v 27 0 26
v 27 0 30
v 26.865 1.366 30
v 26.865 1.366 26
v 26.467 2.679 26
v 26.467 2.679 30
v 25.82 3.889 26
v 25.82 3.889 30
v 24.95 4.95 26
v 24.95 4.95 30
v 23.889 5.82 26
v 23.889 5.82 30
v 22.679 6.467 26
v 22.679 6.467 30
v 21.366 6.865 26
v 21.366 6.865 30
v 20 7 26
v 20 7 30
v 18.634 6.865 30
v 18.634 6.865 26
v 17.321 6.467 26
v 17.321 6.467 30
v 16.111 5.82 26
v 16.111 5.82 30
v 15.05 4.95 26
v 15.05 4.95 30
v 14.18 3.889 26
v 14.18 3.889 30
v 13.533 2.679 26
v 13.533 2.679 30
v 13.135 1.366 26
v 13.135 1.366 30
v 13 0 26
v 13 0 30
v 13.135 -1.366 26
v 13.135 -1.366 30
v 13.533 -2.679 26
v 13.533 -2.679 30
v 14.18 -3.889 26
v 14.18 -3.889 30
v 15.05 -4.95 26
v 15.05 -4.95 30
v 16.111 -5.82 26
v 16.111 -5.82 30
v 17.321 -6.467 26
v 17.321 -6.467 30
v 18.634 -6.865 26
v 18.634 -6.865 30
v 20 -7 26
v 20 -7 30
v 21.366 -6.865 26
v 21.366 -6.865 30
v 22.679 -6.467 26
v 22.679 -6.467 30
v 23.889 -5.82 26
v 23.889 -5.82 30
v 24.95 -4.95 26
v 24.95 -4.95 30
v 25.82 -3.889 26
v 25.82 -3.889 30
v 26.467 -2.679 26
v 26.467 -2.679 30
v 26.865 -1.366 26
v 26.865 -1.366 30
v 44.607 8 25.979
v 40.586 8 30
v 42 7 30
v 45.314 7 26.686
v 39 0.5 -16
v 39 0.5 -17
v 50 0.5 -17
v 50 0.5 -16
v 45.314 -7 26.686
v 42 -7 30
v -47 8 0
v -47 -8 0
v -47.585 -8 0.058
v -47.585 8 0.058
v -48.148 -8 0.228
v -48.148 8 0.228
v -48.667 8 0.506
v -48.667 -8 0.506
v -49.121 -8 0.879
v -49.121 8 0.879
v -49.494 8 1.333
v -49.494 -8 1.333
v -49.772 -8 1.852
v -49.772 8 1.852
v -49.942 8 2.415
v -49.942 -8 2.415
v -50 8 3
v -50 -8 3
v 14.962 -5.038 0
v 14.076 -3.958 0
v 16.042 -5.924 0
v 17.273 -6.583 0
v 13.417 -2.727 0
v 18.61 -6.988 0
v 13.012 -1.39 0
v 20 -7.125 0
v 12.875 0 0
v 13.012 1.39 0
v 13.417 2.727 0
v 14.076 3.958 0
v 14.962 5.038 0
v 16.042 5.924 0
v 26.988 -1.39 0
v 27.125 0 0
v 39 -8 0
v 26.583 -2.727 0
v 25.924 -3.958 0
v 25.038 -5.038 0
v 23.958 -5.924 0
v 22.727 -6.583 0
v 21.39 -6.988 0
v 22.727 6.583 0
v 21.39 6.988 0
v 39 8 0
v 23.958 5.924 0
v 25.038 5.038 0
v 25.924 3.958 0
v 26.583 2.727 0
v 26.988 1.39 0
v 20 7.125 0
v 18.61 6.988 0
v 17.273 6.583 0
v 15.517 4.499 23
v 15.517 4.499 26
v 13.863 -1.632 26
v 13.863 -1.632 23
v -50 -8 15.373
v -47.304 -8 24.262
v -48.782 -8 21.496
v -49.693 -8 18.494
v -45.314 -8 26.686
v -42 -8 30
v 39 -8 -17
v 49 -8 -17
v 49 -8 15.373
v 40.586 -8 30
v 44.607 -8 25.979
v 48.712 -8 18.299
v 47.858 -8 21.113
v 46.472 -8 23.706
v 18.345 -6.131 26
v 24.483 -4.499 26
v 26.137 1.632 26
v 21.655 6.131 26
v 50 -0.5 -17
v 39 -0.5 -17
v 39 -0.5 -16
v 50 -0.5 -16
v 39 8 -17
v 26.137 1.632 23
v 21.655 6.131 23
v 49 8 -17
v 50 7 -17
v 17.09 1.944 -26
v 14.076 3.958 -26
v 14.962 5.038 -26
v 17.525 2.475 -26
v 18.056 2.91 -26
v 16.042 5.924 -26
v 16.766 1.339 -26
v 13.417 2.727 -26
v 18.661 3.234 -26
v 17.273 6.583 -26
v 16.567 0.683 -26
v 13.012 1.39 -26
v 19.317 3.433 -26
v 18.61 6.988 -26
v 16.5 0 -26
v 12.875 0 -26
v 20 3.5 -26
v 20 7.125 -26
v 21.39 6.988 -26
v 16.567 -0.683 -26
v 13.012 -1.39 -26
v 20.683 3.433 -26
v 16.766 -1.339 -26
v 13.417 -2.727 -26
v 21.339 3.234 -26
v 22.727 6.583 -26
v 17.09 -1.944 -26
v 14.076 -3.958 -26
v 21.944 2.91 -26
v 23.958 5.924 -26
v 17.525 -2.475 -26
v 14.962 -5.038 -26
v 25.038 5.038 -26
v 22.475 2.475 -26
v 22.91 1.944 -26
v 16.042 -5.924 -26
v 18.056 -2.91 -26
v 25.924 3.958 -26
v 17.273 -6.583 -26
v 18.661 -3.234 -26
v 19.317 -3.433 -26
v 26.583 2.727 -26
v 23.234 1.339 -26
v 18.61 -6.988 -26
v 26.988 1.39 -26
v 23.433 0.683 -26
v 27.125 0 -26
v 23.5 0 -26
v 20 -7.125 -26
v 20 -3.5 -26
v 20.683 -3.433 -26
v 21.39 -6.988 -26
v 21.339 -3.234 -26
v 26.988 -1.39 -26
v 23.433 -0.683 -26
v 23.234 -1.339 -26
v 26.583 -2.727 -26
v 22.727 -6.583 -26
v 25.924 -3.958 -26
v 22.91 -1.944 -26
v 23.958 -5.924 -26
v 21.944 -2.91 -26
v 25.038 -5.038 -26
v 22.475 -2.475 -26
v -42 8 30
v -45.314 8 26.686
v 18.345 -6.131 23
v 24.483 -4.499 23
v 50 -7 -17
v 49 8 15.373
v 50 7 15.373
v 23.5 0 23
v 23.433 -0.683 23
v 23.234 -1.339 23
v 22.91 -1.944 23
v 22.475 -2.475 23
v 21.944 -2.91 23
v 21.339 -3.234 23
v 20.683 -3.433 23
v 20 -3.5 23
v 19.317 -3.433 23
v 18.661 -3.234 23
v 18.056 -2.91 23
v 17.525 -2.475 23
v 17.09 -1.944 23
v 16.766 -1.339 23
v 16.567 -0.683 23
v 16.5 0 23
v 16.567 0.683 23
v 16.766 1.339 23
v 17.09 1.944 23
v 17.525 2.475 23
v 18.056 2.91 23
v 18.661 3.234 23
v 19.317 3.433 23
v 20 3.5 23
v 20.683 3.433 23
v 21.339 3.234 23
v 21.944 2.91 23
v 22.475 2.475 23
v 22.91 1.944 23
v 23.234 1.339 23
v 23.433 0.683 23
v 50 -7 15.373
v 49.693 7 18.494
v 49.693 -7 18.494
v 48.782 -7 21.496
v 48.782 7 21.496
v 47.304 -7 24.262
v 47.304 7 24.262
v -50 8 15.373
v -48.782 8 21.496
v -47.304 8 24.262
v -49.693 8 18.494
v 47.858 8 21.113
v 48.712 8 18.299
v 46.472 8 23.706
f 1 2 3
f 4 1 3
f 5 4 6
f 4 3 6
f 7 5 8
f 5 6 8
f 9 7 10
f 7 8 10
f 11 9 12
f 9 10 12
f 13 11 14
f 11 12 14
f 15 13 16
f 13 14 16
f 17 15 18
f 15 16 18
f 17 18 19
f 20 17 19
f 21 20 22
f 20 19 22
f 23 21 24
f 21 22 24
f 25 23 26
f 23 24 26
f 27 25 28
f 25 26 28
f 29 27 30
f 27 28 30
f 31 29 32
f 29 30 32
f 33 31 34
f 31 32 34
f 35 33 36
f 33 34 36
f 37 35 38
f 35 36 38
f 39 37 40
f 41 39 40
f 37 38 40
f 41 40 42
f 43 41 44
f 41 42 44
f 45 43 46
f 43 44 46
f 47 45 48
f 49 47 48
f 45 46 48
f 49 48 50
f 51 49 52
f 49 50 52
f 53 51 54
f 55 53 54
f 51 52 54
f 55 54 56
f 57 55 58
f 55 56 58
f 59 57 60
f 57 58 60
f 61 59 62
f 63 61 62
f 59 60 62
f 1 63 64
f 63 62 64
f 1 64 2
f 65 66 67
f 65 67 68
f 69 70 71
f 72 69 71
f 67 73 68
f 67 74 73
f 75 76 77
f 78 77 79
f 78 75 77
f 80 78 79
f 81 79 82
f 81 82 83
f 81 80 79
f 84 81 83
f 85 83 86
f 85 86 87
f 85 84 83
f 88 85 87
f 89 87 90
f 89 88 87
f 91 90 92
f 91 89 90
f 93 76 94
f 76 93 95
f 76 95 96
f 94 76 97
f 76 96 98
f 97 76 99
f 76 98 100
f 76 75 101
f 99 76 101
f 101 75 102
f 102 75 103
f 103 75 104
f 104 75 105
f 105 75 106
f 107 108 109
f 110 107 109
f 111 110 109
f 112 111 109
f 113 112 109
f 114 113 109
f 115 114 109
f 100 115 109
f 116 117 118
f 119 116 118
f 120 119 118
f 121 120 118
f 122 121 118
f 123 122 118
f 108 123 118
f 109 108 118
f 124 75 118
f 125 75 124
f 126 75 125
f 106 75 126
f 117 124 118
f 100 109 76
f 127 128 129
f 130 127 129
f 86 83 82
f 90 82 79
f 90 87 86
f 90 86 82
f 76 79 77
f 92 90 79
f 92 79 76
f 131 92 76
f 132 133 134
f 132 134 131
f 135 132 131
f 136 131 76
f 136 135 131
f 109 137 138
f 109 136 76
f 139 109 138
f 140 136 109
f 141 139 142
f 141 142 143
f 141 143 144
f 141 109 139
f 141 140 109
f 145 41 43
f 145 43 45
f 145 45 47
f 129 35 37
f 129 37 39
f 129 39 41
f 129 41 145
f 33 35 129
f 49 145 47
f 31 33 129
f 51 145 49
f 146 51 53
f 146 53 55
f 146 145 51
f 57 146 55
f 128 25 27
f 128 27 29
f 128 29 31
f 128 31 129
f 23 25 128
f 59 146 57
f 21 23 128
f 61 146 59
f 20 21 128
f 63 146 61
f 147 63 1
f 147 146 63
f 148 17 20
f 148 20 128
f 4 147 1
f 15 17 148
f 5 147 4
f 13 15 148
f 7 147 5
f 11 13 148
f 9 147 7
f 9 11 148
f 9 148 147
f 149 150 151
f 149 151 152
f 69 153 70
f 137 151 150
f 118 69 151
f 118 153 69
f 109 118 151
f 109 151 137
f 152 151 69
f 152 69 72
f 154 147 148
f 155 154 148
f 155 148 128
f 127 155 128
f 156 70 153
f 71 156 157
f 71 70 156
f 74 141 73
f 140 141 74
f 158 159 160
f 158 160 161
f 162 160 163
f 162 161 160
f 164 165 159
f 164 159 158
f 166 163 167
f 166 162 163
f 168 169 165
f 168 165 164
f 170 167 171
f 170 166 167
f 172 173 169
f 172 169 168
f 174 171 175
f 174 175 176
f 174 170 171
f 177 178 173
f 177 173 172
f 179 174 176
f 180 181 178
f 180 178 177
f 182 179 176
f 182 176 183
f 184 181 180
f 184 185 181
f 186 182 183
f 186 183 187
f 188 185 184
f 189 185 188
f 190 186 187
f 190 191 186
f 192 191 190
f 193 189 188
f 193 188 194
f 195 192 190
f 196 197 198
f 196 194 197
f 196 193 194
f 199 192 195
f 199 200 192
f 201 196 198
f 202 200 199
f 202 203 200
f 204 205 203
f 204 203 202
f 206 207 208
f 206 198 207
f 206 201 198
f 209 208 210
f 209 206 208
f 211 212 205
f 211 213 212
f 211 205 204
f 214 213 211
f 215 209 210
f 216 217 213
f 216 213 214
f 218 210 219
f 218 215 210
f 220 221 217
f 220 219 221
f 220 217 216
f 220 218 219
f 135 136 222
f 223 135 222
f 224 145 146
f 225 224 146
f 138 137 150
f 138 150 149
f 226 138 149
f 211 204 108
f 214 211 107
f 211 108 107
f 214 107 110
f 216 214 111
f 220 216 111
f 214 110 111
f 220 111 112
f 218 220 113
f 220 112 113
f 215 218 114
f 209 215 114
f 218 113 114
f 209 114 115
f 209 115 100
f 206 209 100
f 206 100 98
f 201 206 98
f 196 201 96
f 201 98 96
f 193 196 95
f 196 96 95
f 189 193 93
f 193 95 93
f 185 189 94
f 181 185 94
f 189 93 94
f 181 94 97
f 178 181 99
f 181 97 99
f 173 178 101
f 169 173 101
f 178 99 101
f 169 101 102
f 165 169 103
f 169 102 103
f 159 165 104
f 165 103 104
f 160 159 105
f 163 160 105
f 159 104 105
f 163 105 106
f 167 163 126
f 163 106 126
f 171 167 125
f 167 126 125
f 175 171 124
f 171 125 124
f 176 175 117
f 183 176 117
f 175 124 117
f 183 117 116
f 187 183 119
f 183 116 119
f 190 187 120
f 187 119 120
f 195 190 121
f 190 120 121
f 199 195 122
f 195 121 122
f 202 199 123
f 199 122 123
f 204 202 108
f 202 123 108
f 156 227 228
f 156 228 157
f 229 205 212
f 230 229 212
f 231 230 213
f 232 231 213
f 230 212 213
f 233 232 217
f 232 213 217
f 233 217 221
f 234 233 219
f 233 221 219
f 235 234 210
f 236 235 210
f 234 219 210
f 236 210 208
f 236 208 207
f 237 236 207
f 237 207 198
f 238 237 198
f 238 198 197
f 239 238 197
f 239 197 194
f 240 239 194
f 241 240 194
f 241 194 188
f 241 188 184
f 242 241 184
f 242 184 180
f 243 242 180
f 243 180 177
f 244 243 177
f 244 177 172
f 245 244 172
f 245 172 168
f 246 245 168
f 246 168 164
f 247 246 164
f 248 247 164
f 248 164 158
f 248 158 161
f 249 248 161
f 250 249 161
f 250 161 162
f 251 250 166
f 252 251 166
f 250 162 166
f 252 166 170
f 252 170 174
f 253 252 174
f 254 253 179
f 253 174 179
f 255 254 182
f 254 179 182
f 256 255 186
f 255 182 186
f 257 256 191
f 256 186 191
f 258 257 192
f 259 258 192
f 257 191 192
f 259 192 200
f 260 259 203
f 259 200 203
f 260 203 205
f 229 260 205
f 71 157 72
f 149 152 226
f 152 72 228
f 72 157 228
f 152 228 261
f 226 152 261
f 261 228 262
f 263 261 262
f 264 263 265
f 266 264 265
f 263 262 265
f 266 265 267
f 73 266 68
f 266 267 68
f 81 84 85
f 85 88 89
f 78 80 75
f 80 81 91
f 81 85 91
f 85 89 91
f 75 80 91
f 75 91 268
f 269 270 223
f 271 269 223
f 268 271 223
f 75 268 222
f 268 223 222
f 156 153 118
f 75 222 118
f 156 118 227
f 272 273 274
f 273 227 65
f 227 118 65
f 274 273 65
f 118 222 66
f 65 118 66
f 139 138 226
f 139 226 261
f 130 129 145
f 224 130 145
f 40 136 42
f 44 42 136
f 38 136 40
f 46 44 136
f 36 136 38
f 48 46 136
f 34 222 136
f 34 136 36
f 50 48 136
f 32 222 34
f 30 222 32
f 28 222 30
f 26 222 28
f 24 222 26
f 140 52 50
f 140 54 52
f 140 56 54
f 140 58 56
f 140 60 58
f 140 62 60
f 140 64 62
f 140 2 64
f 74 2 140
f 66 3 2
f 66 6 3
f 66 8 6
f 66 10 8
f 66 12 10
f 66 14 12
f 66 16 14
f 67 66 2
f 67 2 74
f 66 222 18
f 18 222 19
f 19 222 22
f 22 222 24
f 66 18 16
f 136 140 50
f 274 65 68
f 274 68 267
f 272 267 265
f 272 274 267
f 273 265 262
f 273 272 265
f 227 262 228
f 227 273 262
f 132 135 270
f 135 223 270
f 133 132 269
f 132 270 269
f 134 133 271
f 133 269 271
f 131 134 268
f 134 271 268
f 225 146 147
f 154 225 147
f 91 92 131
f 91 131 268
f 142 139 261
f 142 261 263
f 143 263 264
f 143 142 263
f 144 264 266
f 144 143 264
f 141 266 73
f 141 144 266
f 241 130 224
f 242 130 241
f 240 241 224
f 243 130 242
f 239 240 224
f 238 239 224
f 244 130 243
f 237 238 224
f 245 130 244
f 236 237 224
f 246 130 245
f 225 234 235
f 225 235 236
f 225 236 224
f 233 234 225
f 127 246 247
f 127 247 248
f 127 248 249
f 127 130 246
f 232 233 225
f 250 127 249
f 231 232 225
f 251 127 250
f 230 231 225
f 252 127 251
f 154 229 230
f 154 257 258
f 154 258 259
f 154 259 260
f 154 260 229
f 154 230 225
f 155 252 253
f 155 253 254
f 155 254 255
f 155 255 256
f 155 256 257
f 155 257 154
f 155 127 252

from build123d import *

# Parameters (mm, degrees)
SKETCH_W        = 100
SKETCH_H        = 16
PAD_DEPTH       = 30
SKETCH001_R     = 7.125
PAD001_DEPTH    = 26
SKETCH002_W     = 11
SKETCH002_H     = 16
PAD002_DEPTH    = 17
SKETCH004_R     = 3.5
POCKET_DEPTH    = 56.001
SKETCH005_R     = 7
POCKET001_DEPTH = 4
POCKET002_DEPTH = 7
SKETCH007_W     = 27.137496
SKETCH007_H     = 1
POCKET003_DEPTH = 1
CHAMFER_SIZE    = 8
FILLET_R        = 16
FILLET001_R     = 3
CHAMFER001_SIZE = 1
CHAMFER002_SIZE = 1


with BuildPart() as part:
    # Sketch → Pad (new body)
    with BuildSketch(Plane.XY):
        Rectangle(SKETCH_W, SKETCH_H)
    extrude(amount=PAD_DEPTH)

    # Sketch001 (on Face5 of Pad) → Pad001 (join)
    with BuildSketch(Plane(origin=(0, 0, 0), x_dir=(1, 0, 0), z_dir=(0, 0, -1))):
        with Locations((20, 0)):
            Circle(SKETCH001_R)
    extrude(amount=PAD001_DEPTH)

    # Sketch002 (on Face4 of Pad001) → Pad002 (join)
    with BuildSketch(Plane(origin=(0, 0, 0), x_dir=(1, 0, 0), z_dir=(0, 0, -1))):
        with Locations((44.5, 0)):
            Rectangle(SKETCH002_W, SKETCH002_H)
    extrude(amount=PAD002_DEPTH)

    # Sketch004 (on Face13 of Pad002) → Pocket (cut, through all)
    with BuildSketch(Plane(origin=(0, 0, -26), x_dir=(1, 0, 0), z_dir=(0, 0, -1))):
        with Locations((20, 0)):
            Circle(SKETCH004_R)
    extrude(amount=-POCKET_DEPTH, mode=Mode.SUBTRACT)

    # Sketch005 (on Face6 of Pocket) → Pocket001 (cut)
    with BuildSketch(Plane.XY.offset(30)):
        with Locations((20, 0)):
            Circle(SKETCH005_R)
    extrude(amount=-POCKET001_DEPTH, mode=Mode.SUBTRACT)

    # Sketch006 (on Face6 of Pocket001) → Pocket002 (cut)
    with BuildSketch(Plane.XY.offset(30)):
        Polygon((24.48251, -4.498938), (26.137449, 1.632498), (21.65494, 6.131436), (15.51749, 4.498938), (13.862551, -1.632498), (18.34506, -6.131436), align=None)
    extrude(amount=-POCKET002_DEPTH, mode=Mode.SUBTRACT)

    # Sketch007 (on Face11 of Pocket002) → Pocket003 (cut)
    with BuildSketch(Plane(origin=(0, 0, -17), x_dir=(1, 0, 0), z_dir=(0, 0, -1))):
        with Locations((48.876606, 0)):
            Rectangle(SKETCH007_W, SKETCH007_H)
    extrude(amount=-POCKET003_DEPTH, mode=Mode.SUBTRACT)

    # Chamfer
    chamfer_edges = [part.edges().sort_by_distance(p)[0] for p in [
        (50, 0, 30),
        (-50, 0, 30),
    ]]
    chamfer(chamfer_edges, length=CHAMFER_SIZE)

    # Fillet
    fillet_edges = [part.edges().sort_by_distance(p)[0] for p in [
        (50, 0, 22),
        (-50, 0, 22),
    ]]
    fillet(fillet_edges, radius=FILLET_R)

    # Fillet001
    fillet001_edges = [part.edges().sort_by_distance(p)[0] for p in [
        (-50, 0, 0),
    ]]
    fillet(fillet001_edges, radius=FILLET001_R)

    # Chamfer001
    chamfer001_edges = [part.edges().sort_by_distance(p)[0] for p in [
        (50, 8, -8.5),
    ]]
    chamfer(chamfer001_edges, length=CHAMFER001_SIZE)

    # Chamfer002
    chamfer002_edges = [part.edges().sort_by_distance(p)[0] for p in [
        (50, -8, -8.5),
    ]]
    chamfer(chamfer002_edges, length=CHAMFER002_SIZE)


solid = part.part
